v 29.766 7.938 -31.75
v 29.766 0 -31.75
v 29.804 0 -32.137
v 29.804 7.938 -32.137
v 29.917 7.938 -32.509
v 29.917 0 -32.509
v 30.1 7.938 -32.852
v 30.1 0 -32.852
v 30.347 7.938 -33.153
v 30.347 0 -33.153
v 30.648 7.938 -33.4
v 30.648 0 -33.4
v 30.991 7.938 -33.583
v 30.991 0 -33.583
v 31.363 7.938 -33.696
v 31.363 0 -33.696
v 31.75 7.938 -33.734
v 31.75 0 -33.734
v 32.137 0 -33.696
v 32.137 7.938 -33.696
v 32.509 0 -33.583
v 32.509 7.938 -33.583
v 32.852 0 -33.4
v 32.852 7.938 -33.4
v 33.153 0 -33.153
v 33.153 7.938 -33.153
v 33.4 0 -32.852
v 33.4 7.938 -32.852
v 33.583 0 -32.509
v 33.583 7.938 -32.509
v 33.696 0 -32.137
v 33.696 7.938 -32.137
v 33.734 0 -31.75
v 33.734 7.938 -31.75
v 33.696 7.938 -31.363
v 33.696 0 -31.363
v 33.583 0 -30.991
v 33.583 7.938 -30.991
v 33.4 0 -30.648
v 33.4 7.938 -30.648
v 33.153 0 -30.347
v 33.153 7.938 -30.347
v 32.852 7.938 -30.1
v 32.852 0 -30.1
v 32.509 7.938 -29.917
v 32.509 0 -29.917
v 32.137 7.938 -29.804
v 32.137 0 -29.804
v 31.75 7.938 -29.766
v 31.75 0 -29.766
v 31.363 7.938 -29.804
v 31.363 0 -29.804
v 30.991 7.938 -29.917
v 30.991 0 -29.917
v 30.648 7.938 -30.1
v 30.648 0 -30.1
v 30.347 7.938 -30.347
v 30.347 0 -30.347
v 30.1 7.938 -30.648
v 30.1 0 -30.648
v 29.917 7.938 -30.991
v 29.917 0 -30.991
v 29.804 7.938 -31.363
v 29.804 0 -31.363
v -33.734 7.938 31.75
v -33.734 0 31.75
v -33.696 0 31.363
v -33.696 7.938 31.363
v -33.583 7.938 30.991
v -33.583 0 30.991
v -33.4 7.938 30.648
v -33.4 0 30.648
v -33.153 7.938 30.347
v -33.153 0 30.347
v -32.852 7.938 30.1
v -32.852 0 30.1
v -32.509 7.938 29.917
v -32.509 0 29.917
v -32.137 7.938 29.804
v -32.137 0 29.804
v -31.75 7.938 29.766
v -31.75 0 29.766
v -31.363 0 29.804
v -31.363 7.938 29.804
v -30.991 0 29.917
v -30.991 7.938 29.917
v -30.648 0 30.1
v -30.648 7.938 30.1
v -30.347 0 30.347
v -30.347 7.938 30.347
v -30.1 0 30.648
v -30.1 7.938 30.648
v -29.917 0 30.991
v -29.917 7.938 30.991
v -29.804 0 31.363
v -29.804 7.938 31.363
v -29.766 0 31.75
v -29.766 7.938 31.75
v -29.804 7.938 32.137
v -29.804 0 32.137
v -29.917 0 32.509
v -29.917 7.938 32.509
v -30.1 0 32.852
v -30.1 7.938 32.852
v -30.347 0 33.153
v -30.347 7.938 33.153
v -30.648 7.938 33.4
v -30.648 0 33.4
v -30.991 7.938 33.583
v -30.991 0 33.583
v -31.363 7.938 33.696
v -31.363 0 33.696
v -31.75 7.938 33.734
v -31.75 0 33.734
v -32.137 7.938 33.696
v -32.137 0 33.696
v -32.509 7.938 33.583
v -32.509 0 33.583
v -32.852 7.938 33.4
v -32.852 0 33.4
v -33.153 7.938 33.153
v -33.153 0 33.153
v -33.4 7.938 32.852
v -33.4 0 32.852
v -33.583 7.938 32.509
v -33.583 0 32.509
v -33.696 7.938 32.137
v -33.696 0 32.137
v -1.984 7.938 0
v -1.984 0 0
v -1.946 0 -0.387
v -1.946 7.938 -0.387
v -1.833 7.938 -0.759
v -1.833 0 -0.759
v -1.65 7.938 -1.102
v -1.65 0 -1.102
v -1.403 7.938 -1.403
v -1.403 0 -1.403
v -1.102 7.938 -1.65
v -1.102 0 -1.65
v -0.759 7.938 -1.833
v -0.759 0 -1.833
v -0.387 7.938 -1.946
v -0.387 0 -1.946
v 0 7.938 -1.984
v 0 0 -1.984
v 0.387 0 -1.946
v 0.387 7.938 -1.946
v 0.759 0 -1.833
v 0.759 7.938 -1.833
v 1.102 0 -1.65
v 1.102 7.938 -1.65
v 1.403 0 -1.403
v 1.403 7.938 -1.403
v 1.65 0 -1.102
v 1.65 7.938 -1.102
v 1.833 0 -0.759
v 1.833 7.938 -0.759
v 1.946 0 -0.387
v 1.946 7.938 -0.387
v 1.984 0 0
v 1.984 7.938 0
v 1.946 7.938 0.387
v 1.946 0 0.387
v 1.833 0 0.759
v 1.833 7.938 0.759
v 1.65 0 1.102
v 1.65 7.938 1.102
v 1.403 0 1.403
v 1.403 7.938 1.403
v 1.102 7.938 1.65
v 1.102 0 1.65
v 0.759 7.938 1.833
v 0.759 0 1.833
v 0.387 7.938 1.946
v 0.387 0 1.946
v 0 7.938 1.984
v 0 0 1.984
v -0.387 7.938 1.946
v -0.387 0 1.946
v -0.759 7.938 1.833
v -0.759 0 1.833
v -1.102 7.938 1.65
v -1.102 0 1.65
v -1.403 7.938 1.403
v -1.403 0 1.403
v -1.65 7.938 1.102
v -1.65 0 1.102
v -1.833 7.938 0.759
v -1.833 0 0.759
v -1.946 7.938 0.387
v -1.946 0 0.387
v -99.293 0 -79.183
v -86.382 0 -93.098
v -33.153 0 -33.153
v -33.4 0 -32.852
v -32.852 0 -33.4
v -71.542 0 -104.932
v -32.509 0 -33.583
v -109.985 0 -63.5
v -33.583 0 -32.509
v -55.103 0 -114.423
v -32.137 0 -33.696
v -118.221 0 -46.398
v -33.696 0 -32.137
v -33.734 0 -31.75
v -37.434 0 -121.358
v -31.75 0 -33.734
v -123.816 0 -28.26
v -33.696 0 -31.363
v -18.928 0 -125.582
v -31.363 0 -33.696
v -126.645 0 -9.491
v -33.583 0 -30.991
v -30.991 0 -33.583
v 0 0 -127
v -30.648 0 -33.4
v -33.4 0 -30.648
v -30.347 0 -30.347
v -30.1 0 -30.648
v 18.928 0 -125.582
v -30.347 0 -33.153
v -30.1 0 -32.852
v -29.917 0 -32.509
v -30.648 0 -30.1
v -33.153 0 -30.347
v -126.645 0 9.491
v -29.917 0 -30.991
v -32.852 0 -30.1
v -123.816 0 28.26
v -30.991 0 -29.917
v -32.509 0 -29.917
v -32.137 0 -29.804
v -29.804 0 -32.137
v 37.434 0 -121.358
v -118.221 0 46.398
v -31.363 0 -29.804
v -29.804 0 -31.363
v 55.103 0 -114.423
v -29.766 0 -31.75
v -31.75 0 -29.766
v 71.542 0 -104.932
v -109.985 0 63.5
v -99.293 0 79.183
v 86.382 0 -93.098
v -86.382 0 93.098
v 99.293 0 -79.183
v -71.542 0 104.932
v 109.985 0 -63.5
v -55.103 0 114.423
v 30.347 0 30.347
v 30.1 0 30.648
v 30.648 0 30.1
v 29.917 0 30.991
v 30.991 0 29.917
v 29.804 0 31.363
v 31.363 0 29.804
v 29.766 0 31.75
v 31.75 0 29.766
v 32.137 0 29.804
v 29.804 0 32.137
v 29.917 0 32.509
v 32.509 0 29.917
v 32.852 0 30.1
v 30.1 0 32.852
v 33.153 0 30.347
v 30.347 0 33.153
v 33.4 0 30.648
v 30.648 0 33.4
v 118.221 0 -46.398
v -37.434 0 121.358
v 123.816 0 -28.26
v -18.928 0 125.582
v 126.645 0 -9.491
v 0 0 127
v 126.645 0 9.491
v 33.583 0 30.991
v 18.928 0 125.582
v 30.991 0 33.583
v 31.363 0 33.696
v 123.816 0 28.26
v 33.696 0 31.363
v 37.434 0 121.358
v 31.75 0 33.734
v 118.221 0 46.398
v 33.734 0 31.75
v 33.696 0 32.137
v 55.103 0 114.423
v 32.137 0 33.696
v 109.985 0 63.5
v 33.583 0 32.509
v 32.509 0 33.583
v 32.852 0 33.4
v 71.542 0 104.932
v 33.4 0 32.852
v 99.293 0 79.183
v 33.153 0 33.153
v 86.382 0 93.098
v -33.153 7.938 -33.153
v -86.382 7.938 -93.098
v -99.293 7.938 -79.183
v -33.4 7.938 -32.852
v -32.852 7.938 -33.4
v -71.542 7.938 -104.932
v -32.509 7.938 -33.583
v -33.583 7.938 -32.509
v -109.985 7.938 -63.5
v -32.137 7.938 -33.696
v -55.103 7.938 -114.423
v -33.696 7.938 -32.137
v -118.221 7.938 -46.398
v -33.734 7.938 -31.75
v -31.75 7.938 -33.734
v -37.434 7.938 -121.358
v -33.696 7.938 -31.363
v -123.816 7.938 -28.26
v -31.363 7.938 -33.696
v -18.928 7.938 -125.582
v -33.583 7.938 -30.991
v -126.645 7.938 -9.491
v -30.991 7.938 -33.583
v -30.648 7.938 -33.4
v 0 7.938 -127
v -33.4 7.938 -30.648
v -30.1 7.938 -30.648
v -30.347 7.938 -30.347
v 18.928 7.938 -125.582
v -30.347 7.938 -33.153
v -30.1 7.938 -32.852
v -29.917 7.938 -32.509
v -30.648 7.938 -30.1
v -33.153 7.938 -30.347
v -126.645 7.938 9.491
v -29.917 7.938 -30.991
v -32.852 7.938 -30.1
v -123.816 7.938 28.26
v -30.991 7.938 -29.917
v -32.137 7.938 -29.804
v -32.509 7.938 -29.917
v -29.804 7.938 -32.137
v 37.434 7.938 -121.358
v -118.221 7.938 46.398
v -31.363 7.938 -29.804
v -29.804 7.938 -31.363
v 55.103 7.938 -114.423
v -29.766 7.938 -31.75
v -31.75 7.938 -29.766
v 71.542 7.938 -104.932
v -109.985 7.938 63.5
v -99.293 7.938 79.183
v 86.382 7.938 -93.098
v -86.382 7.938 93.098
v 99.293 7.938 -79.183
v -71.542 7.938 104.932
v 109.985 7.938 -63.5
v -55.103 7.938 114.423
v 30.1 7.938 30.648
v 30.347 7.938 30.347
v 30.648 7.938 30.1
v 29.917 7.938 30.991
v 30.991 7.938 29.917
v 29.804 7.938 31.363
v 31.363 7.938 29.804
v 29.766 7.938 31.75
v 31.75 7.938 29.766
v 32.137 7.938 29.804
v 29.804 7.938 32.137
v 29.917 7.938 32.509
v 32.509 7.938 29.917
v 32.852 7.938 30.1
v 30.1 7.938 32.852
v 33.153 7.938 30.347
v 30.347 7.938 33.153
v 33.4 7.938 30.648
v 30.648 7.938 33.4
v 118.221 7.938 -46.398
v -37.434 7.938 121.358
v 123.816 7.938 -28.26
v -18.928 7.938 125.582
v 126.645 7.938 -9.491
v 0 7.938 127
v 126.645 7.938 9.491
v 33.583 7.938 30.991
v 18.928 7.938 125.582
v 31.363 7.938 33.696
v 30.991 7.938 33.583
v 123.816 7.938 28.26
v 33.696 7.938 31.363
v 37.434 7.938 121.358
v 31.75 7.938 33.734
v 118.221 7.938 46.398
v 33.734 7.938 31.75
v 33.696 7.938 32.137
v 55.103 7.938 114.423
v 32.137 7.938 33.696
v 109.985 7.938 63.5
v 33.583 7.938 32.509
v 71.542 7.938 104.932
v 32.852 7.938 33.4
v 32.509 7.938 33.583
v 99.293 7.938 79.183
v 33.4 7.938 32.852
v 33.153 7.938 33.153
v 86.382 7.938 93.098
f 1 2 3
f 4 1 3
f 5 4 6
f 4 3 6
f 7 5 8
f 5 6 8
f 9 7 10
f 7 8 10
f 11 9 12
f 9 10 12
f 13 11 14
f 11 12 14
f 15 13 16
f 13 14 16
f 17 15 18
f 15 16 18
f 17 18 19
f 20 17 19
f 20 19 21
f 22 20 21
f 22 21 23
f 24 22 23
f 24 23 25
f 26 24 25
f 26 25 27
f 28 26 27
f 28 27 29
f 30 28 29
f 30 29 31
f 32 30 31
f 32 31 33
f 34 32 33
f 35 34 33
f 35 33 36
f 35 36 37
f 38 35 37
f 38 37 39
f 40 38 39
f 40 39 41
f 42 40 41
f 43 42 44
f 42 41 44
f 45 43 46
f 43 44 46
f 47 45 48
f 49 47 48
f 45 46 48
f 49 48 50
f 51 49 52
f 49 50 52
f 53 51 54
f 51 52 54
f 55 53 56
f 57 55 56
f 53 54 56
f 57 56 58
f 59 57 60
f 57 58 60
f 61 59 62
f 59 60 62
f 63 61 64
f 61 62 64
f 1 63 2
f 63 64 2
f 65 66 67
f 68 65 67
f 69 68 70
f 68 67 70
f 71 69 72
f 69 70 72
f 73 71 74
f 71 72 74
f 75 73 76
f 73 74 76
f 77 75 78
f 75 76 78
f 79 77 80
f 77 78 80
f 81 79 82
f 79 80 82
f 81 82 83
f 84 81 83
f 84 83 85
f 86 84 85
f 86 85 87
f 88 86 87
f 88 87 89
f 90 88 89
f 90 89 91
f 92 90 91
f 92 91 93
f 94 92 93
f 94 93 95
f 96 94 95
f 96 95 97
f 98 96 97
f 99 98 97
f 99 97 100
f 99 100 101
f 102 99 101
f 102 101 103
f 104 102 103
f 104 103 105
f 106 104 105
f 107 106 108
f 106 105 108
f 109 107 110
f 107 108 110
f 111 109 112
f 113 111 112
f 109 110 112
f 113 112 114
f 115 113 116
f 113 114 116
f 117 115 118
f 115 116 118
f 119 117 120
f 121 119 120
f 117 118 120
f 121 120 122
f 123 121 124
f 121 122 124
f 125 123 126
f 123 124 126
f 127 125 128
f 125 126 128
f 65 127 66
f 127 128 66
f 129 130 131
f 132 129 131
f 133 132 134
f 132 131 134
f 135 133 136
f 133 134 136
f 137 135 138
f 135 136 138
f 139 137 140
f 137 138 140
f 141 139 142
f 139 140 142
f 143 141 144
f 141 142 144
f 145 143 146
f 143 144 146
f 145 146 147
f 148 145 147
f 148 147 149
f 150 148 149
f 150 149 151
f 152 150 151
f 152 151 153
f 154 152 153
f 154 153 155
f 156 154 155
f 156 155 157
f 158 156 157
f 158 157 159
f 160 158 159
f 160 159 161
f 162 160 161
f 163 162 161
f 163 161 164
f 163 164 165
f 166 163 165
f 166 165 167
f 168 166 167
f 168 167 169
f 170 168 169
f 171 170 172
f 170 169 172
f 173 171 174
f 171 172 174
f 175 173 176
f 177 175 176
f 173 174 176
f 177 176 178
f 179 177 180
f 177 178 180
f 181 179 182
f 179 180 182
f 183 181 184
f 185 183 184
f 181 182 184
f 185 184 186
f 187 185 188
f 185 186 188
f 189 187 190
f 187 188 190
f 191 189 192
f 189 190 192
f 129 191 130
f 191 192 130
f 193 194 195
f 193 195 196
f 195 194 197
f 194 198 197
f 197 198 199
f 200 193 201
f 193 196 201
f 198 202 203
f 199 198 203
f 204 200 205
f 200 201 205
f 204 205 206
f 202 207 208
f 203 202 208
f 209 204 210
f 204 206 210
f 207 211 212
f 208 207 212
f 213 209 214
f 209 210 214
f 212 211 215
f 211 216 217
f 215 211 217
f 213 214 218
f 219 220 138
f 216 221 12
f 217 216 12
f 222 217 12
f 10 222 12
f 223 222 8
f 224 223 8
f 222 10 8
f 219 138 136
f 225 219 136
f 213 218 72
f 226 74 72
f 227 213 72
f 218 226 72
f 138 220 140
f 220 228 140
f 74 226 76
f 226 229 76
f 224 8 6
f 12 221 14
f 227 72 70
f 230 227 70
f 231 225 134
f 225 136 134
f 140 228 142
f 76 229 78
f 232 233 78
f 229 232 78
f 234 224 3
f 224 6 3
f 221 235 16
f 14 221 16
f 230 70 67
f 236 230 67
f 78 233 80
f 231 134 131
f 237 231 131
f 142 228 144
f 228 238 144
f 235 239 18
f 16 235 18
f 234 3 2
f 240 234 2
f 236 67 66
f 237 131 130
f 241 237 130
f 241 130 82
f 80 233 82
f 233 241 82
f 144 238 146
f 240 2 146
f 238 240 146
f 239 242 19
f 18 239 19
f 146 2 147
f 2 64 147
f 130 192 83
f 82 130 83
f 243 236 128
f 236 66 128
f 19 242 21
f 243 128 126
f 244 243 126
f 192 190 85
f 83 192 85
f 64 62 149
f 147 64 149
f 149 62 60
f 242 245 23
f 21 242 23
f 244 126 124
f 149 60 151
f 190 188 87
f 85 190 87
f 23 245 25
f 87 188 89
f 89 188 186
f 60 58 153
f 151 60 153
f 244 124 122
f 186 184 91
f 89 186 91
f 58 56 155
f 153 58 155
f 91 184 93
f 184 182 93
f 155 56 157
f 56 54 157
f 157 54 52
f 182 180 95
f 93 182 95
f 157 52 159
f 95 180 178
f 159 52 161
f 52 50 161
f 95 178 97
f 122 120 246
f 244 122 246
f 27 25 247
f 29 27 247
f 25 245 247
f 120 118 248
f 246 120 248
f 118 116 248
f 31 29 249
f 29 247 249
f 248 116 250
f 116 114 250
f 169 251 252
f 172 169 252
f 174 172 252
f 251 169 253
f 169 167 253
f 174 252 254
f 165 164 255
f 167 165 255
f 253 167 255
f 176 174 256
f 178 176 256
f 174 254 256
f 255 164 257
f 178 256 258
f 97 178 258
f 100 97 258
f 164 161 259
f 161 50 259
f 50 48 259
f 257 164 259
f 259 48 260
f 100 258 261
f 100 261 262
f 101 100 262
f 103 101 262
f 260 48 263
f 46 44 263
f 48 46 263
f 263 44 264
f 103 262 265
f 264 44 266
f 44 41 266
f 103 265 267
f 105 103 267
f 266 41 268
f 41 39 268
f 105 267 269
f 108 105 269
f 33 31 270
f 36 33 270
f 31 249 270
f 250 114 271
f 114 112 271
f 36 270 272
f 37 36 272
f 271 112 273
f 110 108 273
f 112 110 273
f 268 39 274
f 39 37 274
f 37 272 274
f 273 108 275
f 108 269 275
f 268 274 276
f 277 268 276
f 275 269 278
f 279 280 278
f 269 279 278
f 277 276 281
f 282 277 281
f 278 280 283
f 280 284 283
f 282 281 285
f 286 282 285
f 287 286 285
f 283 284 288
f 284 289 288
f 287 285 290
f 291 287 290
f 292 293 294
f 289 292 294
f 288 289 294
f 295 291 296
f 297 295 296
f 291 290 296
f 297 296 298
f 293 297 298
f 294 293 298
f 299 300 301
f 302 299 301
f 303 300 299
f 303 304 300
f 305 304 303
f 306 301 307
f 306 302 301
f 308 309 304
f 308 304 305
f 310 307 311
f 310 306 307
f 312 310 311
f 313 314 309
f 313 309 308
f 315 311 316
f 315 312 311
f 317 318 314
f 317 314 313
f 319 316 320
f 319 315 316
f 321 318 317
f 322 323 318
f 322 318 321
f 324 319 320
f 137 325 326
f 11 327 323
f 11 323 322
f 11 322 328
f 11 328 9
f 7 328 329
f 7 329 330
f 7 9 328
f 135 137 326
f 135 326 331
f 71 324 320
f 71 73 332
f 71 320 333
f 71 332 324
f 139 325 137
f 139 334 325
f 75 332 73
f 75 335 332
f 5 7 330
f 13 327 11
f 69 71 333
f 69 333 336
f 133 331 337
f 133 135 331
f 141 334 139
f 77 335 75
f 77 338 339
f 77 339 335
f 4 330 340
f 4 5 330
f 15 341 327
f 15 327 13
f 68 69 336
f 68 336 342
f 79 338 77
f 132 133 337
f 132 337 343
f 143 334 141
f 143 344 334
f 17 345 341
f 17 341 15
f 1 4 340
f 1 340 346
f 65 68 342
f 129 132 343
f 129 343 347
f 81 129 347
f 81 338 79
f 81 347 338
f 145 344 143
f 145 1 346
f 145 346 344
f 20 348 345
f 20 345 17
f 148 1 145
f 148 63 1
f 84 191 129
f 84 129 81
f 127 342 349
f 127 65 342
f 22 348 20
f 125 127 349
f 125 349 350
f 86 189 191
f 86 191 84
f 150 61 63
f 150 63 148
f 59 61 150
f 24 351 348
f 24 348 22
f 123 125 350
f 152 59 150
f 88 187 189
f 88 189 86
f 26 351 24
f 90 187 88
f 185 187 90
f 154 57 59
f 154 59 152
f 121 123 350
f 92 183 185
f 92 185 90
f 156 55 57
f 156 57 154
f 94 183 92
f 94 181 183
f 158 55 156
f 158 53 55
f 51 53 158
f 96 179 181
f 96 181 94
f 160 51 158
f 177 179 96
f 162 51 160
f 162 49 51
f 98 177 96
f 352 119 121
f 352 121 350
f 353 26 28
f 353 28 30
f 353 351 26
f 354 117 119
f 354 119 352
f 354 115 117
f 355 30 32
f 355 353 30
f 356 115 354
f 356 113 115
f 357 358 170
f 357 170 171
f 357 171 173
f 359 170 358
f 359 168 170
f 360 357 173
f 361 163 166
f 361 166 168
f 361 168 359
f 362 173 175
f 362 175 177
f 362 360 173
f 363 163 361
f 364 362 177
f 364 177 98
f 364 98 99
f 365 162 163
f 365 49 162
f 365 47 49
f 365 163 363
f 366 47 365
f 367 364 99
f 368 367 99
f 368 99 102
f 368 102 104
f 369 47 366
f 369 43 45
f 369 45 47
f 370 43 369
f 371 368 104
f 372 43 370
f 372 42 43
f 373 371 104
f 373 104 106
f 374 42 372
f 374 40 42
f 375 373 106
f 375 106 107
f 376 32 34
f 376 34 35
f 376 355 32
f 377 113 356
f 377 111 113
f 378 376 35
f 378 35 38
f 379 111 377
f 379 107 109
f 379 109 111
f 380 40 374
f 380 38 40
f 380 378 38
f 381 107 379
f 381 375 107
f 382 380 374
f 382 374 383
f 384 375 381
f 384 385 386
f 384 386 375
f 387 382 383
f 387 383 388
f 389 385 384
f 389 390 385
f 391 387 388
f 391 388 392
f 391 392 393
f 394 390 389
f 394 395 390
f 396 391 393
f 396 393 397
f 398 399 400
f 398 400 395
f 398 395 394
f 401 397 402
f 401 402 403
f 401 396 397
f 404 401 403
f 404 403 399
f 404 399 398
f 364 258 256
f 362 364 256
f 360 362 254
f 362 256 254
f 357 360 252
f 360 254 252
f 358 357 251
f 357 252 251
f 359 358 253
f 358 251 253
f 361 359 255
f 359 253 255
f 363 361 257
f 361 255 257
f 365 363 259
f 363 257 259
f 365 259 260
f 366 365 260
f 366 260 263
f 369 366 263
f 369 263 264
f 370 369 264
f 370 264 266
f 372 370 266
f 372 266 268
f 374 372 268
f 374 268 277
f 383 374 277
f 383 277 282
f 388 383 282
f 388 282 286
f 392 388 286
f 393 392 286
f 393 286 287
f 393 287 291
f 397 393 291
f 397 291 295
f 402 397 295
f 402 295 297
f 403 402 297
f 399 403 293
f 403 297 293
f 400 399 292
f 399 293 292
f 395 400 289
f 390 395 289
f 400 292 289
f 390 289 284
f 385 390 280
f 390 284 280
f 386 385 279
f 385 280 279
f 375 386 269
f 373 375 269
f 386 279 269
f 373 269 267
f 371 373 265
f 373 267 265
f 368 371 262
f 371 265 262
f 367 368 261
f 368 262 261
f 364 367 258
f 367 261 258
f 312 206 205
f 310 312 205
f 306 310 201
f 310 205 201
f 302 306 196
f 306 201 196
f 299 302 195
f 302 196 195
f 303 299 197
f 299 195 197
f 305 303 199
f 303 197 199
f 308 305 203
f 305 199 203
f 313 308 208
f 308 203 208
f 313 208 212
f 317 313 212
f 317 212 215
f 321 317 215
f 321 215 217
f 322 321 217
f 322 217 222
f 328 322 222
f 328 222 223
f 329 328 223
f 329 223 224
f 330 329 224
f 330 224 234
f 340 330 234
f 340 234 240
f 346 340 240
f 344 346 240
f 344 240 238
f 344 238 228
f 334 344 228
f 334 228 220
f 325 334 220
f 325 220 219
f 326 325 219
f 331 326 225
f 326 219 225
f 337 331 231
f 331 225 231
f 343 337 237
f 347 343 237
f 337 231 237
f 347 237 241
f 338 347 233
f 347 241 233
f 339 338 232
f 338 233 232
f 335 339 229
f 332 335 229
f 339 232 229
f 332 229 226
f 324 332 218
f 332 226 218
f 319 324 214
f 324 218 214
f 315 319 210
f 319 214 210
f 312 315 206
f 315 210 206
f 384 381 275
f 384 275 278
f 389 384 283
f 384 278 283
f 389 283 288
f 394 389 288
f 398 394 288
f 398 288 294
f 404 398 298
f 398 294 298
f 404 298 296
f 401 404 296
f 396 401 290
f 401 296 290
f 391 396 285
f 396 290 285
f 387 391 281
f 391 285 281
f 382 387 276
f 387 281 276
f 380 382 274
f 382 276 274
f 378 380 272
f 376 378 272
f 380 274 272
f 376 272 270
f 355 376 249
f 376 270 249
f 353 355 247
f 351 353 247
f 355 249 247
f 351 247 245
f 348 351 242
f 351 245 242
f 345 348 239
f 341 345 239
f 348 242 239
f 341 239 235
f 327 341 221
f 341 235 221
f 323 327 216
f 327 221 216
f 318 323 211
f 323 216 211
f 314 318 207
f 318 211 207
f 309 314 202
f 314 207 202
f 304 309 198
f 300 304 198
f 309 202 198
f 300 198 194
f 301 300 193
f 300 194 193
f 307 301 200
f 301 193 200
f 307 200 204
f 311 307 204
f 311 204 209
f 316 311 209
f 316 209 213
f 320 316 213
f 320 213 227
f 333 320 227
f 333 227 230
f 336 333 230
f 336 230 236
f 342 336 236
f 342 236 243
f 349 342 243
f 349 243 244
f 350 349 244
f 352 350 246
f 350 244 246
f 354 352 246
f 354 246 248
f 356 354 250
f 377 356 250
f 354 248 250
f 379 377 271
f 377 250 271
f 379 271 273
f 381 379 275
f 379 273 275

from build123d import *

# Parameters (mm, degrees)
SKETCH1_R                       = 127
BOSS_EXTRUDE1_DEPTH             = 7.9375
F_5_32_0_15625_DIAMETER_HOLE2_D = 3.96875


with BuildPart() as part:
    # Sketch1 → Boss-Extrude1 (new body)
    with BuildSketch(Plane(origin=(0, 0, 0), x_dir=(1, 0, 0), z_dir=(0, 1, 0))):
        with Locations(Location((0, 0, 0), (0, 0, 270))):
            Circle(SKETCH1_R)
    extrude(amount=BOSS_EXTRUDE1_DEPTH)

    # 5/32 (0.15625) Diameter Hole2 (through all)
    with Locations(Plane(origin=(0, 7.9375, 0), x_dir=(1, 0, 0), z_dir=(0, 1, 0))):
        with Locations((31.75, 31.75), (-31.75, -31.75), (-31.75, 31.75), (31.75, -31.75), (0, 0)):
            Hole(F_5_32_0_15625_DIAMETER_HOLE2_D / 2)


solid = part.part
